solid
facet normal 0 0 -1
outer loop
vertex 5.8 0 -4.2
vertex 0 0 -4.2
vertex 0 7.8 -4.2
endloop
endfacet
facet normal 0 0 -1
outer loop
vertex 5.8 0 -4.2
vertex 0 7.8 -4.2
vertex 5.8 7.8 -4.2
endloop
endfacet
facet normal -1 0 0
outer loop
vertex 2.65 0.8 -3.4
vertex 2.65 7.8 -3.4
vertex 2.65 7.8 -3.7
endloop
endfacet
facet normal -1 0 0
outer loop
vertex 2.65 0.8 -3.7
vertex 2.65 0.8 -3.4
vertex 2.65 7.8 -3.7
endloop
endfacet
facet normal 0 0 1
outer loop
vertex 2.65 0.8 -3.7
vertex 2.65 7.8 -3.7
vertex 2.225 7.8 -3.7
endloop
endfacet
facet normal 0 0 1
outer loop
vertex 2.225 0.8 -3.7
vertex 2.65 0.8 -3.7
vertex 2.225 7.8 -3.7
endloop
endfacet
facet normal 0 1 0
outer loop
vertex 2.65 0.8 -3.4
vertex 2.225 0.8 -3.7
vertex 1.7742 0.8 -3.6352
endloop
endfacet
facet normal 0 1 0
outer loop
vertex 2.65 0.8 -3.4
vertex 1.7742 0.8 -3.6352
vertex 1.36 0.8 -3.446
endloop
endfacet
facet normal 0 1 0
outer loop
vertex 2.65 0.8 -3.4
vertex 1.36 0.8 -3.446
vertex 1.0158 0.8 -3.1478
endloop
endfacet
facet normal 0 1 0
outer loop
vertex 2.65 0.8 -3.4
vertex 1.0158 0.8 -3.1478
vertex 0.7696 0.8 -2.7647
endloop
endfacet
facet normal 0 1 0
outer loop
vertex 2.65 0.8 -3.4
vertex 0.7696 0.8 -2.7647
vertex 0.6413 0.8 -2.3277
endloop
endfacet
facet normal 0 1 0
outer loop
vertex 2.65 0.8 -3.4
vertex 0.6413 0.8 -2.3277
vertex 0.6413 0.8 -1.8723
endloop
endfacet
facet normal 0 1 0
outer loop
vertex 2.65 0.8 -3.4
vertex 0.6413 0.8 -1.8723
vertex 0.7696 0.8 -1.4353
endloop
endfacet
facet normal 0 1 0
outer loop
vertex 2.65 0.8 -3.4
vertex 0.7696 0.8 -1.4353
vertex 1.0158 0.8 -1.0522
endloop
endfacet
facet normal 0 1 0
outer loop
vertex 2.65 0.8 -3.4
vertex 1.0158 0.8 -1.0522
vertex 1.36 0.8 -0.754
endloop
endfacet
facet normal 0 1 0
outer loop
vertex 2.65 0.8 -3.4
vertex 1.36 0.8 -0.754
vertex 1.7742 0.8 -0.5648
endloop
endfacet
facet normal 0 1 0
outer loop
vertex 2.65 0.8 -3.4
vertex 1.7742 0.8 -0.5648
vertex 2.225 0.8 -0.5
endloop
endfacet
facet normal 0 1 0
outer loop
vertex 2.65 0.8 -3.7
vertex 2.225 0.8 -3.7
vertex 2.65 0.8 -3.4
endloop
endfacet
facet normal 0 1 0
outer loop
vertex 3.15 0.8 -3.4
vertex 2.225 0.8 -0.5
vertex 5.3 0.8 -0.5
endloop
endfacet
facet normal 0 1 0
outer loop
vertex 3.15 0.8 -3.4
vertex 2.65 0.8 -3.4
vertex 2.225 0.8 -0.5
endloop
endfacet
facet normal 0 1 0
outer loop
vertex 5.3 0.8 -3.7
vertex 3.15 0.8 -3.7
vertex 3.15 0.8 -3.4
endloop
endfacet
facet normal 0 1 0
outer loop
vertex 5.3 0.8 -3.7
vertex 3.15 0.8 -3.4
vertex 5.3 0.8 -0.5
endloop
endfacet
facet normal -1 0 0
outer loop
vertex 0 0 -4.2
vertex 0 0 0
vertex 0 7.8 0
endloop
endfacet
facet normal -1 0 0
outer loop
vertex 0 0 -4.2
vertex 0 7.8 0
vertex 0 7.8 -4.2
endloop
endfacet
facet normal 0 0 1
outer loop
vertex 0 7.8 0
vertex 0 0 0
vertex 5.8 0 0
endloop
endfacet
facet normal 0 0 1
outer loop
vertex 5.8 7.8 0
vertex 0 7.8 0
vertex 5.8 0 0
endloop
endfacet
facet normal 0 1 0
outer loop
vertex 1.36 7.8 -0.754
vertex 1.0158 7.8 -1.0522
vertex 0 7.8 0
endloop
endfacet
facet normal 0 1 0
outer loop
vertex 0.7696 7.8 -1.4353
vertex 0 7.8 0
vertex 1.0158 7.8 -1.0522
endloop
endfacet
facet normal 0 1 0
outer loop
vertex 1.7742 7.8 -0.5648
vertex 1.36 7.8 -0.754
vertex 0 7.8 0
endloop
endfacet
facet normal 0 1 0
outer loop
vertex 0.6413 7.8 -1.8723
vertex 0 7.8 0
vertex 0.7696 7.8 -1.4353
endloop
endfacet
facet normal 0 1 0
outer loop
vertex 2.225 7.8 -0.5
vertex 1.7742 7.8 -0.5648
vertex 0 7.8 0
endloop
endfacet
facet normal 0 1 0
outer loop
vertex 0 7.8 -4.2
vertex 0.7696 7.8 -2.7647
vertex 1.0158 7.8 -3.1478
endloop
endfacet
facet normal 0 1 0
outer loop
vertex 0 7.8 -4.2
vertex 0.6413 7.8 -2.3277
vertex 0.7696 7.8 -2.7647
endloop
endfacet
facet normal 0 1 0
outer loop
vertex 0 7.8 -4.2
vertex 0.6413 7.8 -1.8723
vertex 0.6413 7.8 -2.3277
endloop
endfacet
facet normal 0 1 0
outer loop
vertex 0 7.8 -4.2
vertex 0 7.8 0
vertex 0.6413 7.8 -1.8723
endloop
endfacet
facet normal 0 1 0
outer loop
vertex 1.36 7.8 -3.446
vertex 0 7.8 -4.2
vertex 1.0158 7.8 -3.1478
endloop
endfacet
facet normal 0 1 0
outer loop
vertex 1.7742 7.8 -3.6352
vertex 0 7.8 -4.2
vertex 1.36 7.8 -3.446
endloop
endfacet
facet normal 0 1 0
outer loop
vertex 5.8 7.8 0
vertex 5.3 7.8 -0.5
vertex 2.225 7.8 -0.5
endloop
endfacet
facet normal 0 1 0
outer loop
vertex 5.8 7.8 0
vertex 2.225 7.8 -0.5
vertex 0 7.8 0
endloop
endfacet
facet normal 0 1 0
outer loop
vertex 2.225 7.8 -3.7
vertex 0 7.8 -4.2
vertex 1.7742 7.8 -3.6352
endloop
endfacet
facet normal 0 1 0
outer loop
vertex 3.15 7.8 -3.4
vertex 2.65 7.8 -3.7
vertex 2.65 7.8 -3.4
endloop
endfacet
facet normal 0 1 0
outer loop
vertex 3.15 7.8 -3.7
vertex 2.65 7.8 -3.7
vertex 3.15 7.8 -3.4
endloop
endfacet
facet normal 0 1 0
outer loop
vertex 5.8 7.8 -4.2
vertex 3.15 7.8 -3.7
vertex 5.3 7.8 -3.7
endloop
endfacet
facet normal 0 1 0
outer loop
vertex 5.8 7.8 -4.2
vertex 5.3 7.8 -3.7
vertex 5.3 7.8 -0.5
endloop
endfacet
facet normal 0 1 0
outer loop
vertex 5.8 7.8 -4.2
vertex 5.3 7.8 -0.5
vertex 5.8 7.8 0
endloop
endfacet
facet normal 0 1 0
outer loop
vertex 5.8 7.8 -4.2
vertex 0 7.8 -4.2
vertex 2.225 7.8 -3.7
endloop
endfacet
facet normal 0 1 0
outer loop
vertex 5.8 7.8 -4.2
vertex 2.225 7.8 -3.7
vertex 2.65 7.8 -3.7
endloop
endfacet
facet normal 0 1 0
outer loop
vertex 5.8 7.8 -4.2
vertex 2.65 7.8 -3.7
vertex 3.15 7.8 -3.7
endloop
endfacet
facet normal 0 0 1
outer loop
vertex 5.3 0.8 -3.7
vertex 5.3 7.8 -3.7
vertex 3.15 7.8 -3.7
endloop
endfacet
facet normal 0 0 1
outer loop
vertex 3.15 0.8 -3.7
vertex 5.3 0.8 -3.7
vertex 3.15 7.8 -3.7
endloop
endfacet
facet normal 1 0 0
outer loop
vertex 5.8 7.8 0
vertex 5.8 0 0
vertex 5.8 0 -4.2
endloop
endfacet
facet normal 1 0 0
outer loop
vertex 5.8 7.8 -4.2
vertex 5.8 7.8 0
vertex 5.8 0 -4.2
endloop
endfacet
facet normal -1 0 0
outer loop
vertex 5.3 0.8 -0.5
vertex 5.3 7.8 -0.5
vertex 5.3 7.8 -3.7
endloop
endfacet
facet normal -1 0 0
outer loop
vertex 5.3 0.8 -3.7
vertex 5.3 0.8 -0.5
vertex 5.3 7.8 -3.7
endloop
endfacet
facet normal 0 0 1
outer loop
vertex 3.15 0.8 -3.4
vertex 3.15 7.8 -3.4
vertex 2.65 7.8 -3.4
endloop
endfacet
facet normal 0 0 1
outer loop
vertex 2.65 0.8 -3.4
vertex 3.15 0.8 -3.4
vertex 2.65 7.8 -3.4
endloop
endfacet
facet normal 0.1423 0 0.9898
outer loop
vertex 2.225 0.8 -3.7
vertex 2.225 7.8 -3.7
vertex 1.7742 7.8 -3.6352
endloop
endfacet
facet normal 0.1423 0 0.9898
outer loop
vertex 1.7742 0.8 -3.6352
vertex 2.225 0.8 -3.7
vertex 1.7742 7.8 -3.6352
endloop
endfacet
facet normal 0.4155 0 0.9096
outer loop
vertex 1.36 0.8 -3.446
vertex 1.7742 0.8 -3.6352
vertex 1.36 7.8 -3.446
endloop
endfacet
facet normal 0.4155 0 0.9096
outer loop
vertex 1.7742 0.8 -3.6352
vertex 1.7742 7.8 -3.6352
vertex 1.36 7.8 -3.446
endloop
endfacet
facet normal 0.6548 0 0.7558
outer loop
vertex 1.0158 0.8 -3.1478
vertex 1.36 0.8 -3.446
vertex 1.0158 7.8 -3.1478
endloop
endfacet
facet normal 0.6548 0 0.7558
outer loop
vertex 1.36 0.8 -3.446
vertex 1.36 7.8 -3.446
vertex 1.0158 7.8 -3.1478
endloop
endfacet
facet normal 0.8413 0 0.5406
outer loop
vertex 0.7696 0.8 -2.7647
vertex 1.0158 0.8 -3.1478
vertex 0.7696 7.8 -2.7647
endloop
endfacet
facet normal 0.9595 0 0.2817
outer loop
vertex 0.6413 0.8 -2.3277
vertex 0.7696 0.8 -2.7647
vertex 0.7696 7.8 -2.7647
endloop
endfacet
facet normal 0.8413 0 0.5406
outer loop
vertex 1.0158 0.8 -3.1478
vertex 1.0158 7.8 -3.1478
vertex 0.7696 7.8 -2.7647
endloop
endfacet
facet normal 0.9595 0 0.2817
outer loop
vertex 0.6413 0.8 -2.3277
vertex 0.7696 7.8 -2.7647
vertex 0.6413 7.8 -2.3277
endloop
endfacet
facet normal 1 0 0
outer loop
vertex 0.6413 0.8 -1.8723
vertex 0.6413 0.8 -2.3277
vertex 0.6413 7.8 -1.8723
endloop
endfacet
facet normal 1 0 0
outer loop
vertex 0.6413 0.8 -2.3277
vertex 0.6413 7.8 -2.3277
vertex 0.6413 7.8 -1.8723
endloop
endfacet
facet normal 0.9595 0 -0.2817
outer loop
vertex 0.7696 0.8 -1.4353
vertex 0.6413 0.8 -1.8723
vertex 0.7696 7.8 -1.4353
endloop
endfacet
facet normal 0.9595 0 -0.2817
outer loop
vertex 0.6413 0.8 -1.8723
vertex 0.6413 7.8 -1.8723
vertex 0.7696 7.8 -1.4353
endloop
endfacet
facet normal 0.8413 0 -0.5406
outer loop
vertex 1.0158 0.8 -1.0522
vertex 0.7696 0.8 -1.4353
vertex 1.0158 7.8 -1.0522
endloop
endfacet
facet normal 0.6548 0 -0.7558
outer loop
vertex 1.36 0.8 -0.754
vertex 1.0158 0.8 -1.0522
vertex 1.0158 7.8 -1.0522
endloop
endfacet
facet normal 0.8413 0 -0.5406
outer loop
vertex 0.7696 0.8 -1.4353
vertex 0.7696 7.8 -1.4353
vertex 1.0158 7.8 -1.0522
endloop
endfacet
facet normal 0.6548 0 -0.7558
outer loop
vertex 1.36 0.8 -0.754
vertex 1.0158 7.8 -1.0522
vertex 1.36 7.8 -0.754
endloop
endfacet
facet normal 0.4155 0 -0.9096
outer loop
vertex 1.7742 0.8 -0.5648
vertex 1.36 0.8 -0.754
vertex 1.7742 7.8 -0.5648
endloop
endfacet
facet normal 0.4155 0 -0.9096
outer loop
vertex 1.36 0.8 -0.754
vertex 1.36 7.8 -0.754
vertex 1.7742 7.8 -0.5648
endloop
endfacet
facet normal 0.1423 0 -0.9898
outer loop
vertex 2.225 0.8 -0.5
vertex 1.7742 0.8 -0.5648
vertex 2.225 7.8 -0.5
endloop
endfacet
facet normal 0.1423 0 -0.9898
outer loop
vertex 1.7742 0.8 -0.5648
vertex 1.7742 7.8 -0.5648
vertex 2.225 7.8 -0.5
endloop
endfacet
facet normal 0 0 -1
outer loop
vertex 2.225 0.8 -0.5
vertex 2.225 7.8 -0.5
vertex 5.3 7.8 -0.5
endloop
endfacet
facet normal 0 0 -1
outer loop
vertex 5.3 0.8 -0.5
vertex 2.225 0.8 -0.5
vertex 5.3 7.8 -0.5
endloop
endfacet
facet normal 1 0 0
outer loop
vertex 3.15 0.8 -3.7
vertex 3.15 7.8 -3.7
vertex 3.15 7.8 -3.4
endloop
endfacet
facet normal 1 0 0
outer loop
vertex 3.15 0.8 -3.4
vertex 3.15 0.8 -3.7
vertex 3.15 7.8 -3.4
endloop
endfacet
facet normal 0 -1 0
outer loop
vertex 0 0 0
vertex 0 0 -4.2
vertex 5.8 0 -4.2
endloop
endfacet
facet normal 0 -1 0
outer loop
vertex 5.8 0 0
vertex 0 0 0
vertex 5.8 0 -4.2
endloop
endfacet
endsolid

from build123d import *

# Parameters (mm, degrees)
SKETCH1_W           = 5.8
SKETCH1_H           = 4.2
BOSS_EXTRUDE1_DEPTH = 7.8
CUT_EXTRUDE1_DEPTH  = 7


with BuildPart() as part:
    # Sketch1 → Boss-Extrude1 (new body)
    with BuildSketch(Plane(origin=(0, 0, 0), x_dir=(1, 0, 0), z_dir=(0, 1, 0))):
        with Locations((2.9, 2.1)):
            Rectangle(SKETCH1_W, SKETCH1_H)
    extrude(amount=BOSS_EXTRUDE1_DEPTH)

    # Sketch2 → Cut-Extrude1 (cut)
    with BuildSketch(Plane(origin=(0, 7.8, 0), x_dir=(1, 0, 0), z_dir=(0, 1, 0))):
        with BuildLine():
            Line((2.225, 0.5), (5.3, 0.5))
            Line((5.3, 0.5), (5.3, 3.7))
            Line((5.3, 3.7), (3.15, 3.7))
            Line((3.15, 3.7), (3.15, 3.4))
            Line((3.15, 3.4), (2.65, 3.4))
            Line((2.65, 3.4), (2.65, 3.7))
            Line((2.65, 3.7), (2.225, 3.7))
            ThreePointArc((2.225, 3.7), (0.625, 2.1), (2.225, 0.5))
        make_face()
    extrude(amount=-CUT_EXTRUDE1_DEPTH, mode=Mode.SUBTRACT)


solid = part.part
